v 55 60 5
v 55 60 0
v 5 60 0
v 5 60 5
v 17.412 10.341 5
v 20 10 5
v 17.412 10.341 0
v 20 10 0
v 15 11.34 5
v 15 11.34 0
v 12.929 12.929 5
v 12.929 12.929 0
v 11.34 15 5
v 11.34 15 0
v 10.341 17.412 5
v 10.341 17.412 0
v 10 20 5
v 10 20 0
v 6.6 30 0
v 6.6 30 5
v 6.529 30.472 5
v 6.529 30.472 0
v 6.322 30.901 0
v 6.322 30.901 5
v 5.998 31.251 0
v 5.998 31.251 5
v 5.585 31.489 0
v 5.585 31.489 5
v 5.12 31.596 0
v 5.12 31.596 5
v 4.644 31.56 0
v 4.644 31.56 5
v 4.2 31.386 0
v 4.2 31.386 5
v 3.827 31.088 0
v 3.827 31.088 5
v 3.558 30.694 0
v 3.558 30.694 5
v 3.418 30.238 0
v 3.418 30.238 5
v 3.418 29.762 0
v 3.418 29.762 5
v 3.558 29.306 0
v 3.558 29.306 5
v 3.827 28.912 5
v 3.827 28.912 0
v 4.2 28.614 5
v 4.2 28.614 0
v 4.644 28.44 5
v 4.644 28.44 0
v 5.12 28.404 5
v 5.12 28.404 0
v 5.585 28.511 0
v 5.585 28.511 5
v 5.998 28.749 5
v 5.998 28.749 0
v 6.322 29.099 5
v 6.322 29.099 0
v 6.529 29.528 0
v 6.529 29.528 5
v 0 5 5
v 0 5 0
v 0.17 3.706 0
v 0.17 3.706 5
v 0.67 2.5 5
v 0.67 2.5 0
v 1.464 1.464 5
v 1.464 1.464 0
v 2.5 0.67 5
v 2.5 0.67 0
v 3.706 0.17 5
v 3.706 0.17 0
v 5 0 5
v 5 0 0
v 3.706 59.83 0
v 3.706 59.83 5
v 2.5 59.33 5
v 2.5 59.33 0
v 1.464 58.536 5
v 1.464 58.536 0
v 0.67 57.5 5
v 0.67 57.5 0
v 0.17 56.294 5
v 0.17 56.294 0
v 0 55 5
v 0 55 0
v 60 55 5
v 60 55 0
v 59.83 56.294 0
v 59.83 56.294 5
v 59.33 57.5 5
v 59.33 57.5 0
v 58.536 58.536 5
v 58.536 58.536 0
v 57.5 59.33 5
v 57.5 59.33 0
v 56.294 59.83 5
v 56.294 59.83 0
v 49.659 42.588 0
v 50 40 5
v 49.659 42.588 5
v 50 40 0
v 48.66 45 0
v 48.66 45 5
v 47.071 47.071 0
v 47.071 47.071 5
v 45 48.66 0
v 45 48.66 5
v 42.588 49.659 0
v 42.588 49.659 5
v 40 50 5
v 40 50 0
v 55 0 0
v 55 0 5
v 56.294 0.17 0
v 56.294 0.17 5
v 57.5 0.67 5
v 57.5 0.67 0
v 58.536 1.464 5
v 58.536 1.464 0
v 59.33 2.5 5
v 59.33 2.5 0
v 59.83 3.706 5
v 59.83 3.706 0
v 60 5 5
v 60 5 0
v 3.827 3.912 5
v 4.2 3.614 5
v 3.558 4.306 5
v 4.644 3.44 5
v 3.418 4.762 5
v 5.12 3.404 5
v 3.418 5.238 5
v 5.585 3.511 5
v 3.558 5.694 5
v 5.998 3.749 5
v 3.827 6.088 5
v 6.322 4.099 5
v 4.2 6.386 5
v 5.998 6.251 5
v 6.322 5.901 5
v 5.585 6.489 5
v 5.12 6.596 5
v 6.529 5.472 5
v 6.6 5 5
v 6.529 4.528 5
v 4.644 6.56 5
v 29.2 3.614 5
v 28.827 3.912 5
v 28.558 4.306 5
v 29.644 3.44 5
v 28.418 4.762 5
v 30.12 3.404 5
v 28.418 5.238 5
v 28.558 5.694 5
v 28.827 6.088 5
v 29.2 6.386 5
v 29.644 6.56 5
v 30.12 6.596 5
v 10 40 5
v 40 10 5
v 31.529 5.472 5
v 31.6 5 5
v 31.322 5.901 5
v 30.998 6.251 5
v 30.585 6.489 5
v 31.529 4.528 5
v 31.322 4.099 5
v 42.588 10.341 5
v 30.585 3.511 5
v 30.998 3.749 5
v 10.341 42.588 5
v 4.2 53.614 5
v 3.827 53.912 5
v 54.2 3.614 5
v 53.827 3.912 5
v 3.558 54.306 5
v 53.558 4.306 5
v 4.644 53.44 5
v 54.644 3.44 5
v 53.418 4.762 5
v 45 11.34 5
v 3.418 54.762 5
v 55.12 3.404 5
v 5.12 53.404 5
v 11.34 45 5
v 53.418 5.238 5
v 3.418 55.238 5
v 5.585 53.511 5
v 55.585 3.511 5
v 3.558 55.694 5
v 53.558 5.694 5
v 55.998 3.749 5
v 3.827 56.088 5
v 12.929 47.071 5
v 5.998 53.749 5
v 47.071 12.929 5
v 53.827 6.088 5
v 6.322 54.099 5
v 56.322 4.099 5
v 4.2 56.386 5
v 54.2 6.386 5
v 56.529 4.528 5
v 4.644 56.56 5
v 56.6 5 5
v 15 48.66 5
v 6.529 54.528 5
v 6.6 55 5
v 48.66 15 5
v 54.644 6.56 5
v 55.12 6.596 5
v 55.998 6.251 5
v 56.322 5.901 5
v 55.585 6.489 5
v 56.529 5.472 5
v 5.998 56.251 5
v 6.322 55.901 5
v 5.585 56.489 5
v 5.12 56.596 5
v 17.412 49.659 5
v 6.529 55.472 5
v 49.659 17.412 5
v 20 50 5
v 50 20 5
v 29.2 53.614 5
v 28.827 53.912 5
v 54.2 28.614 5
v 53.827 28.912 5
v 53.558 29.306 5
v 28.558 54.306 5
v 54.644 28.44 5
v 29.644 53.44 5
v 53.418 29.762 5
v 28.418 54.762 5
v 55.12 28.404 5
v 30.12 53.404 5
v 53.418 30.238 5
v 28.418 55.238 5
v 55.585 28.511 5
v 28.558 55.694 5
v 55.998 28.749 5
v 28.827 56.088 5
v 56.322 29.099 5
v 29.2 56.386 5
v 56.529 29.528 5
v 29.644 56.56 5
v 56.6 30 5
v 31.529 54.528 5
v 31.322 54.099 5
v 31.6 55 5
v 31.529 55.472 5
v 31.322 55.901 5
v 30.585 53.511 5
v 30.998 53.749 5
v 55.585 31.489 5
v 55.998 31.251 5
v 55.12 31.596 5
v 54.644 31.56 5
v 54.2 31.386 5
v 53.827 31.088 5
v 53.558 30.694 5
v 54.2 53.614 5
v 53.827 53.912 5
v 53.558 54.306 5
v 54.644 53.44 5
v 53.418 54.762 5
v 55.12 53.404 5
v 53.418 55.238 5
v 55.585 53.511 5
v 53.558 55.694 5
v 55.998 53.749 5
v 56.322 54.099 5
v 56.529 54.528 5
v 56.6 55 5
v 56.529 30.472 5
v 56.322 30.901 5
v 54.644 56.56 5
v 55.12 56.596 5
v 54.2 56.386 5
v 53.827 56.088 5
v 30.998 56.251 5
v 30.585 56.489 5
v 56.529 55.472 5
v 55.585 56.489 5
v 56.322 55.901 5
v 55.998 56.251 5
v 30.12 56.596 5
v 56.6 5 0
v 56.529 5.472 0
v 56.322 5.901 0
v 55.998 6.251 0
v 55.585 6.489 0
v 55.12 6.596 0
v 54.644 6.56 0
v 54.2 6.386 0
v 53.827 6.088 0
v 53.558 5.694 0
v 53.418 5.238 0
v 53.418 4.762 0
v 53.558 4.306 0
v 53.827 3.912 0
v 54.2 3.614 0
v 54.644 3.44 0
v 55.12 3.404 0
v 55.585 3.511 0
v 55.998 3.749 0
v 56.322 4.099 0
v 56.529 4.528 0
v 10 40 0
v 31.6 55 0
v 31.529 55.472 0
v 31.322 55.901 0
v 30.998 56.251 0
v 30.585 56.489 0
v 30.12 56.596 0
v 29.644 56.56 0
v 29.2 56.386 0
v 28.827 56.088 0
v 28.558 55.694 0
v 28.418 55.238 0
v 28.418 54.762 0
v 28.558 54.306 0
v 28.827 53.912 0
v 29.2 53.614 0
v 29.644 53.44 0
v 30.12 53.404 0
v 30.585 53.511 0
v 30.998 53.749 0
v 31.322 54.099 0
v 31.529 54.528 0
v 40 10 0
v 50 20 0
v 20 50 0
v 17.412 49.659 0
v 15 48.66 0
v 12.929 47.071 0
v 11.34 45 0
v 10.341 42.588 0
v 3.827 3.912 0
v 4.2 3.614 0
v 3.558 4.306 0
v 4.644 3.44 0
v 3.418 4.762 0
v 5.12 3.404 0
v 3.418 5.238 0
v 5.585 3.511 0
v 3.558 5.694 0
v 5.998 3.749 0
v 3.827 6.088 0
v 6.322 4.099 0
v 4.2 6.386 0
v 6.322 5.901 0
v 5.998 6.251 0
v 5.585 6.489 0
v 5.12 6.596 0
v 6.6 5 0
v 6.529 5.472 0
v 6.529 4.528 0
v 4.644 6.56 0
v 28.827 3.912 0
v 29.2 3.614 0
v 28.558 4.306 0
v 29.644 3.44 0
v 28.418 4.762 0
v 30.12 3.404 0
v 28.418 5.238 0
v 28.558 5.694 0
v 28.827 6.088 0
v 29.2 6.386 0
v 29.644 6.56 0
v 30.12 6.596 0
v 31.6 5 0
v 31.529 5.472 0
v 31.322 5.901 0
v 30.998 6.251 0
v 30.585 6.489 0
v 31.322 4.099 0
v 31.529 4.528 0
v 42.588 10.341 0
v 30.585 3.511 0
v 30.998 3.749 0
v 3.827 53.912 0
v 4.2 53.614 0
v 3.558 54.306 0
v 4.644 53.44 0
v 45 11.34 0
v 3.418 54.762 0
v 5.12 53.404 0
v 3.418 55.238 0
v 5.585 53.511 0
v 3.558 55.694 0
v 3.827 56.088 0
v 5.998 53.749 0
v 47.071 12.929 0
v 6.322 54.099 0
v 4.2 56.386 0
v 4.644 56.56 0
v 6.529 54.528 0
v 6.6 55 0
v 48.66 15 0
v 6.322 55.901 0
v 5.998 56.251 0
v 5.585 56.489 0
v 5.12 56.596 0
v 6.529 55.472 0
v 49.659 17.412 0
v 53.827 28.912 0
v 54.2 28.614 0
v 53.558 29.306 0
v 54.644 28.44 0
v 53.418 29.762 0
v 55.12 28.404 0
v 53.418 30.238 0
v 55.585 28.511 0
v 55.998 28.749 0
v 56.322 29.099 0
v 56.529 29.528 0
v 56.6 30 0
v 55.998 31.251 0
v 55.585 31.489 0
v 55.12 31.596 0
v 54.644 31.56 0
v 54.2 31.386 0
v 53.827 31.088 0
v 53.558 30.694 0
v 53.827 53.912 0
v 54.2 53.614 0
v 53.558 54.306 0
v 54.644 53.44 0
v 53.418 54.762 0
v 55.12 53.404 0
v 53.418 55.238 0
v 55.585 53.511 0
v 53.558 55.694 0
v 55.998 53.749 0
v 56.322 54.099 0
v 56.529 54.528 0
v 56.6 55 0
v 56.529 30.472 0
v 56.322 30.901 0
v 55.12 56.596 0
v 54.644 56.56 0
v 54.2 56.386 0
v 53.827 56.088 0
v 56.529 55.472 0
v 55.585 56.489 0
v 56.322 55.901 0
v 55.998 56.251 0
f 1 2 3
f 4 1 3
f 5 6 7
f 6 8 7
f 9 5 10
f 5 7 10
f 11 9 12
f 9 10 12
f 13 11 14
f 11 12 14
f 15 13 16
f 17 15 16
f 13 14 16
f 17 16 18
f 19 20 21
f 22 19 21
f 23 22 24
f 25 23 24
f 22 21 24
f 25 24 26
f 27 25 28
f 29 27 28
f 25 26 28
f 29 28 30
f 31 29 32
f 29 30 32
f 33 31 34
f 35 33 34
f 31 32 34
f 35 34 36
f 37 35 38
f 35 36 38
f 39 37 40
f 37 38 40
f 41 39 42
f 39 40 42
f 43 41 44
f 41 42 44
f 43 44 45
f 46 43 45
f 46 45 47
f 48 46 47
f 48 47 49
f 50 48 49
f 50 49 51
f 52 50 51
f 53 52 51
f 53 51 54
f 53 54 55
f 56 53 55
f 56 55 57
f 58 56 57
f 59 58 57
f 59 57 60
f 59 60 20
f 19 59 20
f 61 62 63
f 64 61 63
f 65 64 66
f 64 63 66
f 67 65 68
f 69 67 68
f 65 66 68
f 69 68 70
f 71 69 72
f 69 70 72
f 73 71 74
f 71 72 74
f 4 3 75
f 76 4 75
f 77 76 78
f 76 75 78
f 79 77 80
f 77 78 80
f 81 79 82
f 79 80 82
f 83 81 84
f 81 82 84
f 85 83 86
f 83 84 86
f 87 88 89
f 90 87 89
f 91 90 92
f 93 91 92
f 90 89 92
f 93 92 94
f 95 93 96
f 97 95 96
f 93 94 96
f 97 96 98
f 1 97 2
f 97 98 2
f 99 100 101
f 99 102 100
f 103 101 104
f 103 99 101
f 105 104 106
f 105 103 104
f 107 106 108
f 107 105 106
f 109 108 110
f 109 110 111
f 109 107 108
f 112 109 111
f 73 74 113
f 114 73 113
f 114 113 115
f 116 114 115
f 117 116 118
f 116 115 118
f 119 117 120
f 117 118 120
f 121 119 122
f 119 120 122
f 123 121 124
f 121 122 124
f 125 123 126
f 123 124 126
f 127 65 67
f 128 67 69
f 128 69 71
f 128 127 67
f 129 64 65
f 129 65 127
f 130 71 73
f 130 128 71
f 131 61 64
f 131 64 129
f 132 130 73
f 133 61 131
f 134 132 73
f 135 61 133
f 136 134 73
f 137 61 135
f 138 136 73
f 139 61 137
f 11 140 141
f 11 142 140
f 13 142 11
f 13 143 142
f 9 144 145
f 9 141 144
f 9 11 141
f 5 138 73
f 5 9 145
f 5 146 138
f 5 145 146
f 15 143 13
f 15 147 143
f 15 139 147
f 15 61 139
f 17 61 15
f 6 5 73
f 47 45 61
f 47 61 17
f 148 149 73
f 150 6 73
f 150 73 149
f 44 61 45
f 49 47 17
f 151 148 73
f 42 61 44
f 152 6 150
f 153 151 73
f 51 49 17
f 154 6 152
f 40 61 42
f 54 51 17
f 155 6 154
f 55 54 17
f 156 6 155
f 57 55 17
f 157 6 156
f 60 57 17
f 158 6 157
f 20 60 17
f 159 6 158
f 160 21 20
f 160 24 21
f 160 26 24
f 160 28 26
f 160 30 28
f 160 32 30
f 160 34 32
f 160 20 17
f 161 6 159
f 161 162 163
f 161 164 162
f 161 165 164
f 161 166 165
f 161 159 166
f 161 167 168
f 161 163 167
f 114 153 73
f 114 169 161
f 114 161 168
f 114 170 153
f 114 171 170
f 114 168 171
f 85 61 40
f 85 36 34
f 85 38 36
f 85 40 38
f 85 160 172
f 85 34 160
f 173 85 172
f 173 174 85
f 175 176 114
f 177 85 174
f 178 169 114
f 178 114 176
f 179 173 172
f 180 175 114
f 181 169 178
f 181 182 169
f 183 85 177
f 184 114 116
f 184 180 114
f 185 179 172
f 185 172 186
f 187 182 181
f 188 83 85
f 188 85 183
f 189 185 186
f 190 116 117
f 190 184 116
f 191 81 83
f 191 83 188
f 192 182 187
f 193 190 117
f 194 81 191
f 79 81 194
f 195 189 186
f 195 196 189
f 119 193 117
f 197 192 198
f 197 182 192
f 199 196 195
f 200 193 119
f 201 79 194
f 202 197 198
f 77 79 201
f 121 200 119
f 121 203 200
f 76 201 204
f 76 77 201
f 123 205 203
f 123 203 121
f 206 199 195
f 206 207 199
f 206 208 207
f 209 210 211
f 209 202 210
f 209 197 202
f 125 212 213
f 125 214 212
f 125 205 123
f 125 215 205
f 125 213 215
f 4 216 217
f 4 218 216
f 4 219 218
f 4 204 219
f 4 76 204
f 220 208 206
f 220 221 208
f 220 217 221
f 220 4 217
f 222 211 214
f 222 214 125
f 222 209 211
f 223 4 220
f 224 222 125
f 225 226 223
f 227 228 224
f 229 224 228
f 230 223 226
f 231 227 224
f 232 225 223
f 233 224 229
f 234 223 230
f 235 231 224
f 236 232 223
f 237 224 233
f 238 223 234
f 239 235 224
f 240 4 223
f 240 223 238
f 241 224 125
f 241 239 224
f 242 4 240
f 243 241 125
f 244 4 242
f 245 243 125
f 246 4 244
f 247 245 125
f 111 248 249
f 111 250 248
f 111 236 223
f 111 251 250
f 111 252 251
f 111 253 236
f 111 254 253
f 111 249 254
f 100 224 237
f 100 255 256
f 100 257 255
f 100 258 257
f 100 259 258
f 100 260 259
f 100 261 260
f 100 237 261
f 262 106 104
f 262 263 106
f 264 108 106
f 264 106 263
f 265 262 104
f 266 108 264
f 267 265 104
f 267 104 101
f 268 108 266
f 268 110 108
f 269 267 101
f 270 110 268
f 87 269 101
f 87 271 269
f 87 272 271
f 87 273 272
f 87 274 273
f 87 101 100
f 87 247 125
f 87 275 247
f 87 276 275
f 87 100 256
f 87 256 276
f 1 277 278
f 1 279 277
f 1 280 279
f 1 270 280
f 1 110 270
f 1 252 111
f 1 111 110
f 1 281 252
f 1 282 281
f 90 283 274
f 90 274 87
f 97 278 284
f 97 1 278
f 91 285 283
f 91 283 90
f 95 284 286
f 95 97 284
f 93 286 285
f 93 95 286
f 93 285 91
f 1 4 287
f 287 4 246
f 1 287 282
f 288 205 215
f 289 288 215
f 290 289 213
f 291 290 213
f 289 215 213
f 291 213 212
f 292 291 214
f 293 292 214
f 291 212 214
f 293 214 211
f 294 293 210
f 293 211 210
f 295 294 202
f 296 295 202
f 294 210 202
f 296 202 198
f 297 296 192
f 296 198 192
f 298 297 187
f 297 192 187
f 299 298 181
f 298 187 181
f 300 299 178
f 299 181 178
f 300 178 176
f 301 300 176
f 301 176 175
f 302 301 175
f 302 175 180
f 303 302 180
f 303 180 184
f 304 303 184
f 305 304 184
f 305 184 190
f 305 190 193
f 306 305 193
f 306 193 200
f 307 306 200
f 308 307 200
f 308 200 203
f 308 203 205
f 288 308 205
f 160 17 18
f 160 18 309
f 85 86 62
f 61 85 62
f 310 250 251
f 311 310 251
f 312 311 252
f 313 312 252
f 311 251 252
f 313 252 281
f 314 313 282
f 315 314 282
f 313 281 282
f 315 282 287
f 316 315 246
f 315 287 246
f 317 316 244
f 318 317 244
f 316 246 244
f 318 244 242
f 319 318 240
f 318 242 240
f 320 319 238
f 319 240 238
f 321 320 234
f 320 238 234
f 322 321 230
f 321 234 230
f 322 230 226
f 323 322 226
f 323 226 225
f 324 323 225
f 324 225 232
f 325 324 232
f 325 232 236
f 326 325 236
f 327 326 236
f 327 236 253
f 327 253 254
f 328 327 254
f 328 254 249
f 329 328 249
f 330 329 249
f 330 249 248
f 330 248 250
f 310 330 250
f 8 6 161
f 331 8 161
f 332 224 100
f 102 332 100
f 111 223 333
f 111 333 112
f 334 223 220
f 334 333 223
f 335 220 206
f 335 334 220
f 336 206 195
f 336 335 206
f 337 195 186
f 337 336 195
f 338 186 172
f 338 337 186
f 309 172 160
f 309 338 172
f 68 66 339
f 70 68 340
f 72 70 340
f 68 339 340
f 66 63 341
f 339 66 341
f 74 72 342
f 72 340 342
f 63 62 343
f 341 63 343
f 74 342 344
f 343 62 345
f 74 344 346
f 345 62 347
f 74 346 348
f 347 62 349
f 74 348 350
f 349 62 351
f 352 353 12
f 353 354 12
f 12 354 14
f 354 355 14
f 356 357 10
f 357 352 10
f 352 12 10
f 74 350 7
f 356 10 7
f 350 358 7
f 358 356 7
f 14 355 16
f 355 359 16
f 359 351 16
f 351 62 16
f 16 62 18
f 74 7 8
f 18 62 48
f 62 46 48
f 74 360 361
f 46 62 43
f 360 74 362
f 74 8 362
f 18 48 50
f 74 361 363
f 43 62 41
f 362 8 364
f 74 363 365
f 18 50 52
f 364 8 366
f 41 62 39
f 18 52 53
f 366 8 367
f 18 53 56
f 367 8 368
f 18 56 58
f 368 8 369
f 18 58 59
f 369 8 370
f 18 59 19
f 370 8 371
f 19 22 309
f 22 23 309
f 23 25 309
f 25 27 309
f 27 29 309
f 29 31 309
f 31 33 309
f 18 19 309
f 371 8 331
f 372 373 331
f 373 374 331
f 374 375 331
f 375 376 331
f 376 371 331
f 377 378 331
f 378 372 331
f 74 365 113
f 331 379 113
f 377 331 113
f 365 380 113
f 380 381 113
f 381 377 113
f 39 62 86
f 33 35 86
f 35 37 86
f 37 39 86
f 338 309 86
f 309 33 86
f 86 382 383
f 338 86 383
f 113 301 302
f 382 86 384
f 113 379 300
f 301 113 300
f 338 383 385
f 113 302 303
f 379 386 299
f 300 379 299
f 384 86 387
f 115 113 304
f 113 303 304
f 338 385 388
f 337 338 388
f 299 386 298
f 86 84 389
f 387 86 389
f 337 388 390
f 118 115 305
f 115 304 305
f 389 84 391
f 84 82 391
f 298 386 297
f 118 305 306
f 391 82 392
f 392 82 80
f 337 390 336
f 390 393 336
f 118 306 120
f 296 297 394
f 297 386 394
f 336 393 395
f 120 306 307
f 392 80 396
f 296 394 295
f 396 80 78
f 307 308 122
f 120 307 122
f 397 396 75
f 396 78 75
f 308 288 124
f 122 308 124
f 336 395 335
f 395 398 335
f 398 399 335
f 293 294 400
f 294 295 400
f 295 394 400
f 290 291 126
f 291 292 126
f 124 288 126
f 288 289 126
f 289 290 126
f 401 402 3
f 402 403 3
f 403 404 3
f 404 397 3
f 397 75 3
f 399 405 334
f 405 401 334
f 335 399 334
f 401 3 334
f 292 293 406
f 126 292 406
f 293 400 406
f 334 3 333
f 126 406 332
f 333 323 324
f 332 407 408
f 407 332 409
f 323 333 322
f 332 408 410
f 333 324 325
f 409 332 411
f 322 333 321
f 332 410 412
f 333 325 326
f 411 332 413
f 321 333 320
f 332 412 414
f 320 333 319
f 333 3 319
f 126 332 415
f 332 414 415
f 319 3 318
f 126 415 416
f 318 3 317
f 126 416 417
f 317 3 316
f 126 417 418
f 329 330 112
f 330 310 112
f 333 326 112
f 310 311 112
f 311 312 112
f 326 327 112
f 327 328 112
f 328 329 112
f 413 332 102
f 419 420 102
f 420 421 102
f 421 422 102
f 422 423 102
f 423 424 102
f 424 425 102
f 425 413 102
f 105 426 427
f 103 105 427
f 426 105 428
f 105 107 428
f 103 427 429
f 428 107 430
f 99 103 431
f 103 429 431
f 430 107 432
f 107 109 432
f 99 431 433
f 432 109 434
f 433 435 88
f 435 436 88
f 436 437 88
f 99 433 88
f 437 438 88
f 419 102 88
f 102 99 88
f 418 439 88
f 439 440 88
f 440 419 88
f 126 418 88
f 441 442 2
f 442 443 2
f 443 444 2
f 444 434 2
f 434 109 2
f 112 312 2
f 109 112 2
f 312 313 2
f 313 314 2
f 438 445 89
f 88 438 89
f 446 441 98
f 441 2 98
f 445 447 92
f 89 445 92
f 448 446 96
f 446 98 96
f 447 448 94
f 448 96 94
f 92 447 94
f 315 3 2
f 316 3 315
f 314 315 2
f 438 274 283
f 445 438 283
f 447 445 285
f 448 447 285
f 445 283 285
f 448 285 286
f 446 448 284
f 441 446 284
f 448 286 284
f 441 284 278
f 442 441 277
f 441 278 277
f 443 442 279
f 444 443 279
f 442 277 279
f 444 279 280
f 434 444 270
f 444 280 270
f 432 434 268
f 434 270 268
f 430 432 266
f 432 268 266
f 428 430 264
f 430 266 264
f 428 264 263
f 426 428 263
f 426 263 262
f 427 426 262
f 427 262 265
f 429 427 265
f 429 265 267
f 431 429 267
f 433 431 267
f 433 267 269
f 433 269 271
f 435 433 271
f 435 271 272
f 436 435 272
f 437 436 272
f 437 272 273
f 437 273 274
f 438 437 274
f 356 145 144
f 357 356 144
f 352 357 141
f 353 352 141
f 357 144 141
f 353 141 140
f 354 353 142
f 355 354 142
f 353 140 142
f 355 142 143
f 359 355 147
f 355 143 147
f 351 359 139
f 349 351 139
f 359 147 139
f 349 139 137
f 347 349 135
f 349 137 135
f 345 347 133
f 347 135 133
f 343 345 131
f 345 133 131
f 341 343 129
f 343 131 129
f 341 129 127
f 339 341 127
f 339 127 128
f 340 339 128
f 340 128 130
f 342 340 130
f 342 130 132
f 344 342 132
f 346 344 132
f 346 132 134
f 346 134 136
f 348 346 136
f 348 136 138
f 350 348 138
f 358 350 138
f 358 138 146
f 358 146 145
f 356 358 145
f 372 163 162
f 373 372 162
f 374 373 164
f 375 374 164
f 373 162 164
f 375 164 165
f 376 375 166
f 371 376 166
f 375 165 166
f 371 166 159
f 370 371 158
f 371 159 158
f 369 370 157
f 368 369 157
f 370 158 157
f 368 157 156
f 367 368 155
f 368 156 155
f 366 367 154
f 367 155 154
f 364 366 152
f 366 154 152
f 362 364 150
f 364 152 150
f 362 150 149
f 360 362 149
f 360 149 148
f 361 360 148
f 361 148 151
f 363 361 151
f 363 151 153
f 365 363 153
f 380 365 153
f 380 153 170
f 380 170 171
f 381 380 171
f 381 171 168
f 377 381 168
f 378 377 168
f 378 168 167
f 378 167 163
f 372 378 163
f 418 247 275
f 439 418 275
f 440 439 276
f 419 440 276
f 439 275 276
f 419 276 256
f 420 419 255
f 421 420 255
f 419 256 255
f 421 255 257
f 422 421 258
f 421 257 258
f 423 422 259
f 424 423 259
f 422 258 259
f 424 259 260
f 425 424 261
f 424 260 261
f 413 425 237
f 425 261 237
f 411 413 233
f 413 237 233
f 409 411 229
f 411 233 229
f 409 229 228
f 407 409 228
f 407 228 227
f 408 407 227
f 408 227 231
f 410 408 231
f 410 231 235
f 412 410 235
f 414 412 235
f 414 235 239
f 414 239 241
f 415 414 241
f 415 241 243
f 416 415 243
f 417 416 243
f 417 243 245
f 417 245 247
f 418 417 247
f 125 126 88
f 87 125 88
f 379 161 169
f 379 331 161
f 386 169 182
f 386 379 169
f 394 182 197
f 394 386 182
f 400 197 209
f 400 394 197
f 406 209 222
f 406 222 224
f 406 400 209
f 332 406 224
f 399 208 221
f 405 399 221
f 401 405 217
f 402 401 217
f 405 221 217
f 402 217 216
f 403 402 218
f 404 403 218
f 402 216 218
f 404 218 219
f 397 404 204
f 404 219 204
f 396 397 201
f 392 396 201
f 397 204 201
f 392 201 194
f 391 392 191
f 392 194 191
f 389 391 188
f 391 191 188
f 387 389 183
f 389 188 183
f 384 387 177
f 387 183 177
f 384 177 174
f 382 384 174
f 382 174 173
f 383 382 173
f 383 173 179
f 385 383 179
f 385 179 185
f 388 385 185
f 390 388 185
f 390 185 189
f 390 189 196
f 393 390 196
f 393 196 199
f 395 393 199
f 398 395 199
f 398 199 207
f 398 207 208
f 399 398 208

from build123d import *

# Parameters (mm, degrees)
EXTRUDE_1_DEPTH     = 5
SKETCH_2_R          = 1.6
SKETCH_2_W          = 40
SKETCH_2_H          = 40
CUT_EXTRUDE_1_DEPTH = 86
FILLET_1_R          = 10


with BuildPart() as part:
    # 草图1 → 凸台-拉伸1 (new body)
    with BuildSketch(Plane.XY):
        with BuildLine():
            Line((5, 0), (55, 0))
            ThreePointArc((55, 0), (58.535533906, 1.464466094), (60, 5))
            Line((60, 5), (60, 55))
            ThreePointArc((60, 55), (58.535533906, 58.535533906), (55, 60))
            Line((55, 60), (5, 60))
            ThreePointArc((5, 60), (1.464466094, 58.535533906), (0, 55))
            Line((0, 55), (0, 5))
            ThreePointArc((0, 5), (1.464466094, 1.464466094), (5, 0))
        make_face()
    extrude(amount=EXTRUDE_1_DEPTH)

    # 草图2 → 切除-拉伸1 (cut, through all)
    with BuildSketch(Plane.XY.offset(5)):
        with Locations((5, 55)):
            Circle(SKETCH_2_R)
        with Locations((30, 55)):
            Circle(SKETCH_2_R)
        with Locations((55, 55)):
            Circle(SKETCH_2_R)
        with Locations((55, 30)):
            Circle(SKETCH_2_R)
        with Locations((30, 5)):
            Circle(SKETCH_2_R)
        with Locations((55, 5)):
            Circle(SKETCH_2_R)
        with Locations((5, 30)):
            Circle(SKETCH_2_R)
        with Locations((5, 5)):
            Circle(SKETCH_2_R)
        with Locations((30, 30)):
            Rectangle(SKETCH_2_W, SKETCH_2_H)
    extrude(amount=-CUT_EXTRUDE_1_DEPTH, mode=Mode.SUBTRACT)

    # 圆角1
    fillet_1_edges = [part.edges().sort_by_distance(p)[0] for p in [
        (10, 10, 2.5),
        (10, 50, 2.5),
        (50, 50, 2.5),
        (50, 10, 2.5),
    ]]
    fillet(fillet_1_edges, radius=FILLET_1_R)


solid = part.part
